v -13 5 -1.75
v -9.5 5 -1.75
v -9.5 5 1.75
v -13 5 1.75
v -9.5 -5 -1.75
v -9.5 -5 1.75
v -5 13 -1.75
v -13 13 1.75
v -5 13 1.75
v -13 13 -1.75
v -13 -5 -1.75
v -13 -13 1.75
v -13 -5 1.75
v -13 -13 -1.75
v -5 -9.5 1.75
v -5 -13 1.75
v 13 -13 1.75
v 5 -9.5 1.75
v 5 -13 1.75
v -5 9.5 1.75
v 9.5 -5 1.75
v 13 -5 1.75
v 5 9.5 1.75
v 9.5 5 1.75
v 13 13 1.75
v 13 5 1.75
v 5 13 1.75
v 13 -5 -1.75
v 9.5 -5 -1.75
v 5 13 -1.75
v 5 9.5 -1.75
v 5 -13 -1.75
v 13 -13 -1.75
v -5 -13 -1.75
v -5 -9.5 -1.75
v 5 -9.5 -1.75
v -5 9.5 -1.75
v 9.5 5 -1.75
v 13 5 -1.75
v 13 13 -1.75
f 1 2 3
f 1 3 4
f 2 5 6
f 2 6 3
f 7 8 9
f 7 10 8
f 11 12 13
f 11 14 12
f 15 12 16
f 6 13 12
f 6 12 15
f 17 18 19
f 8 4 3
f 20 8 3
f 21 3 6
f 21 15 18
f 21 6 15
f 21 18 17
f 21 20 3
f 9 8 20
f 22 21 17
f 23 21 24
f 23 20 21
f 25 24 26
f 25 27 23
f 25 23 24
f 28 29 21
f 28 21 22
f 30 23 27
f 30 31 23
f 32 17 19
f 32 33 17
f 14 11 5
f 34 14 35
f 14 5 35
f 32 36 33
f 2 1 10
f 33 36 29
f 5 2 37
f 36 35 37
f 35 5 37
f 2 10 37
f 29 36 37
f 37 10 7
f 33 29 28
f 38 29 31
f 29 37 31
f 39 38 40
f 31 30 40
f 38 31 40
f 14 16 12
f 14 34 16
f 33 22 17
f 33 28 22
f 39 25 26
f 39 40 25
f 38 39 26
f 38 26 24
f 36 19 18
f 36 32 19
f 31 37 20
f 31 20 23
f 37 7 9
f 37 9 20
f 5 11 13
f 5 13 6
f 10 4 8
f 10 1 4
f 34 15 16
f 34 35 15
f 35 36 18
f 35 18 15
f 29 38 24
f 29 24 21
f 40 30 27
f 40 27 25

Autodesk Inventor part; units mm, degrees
ref_plane "YZ Plane" through (0, 0, 0) normal (1, 0, 0) x (0, 1, 0)
ref_plane "XZ Plane" through (0, 0, 0) normal (0, 1, 0) x (-1, 0, 0)
ref_plane "XY Plane" through (0, 0, 0) normal (0, 0, 1) x (1, 0, 0)
sketch "Sketch1" plane through (0, 0, 0) normal (0, 0, 1) x (1, 0, 0)
  circle A0 centre (0, 0) radius 6
  line L0 (-13, 13) -> (13, 13)
  line L1 (13, 13) -> (13, -13)
  line L2 (13, -13) -> (-13, -13)
  line L3 (-13, -13) -> (-13, 13)
  line L4 (0, 0) -> (13, 13)
  line L5 (6.5, 6.5) -> (13, 13)
  circle A1 centre (9.75, 9.75) radius 0.5
  line L6 (0, 0) -> (-13, 13)
  line L7 (-6.5, 6.5) -> (-13, 13)
  circle A2 centre (-9.75, 9.75) radius 0.5
  line L8 (0, 0) -> (-13, -13)
  line L9 (-6.5, -6.5) -> (-13, -13)
  circle A3 centre (-9.75, -9.75) radius 0.5
  line L10 (0, 0) -> (13, -13)
  line L11 (6.5, -6.5) -> (13, -13)
  circle A4 centre (9.75, -9.75) radius 0.5
  line L12 (-5, -13) -> (5, -13)
  line L13 (5, -13) -> (5, -9.5)
  line L14 (5, -9.5) -> (-5, -9.5)
  line L15 (-5, -9.5) -> (-5, -13)
  line L16 (13, 5) -> (9.5, 5)
  line L17 (9.5, 5) -> (9.5, -5)
  line L18 (9.5, -5) -> (13, -5)
  line L19 (-5, 13) -> (-5, 9.5)
  line L20 (-5, 9.5) -> (5, 9.5)
  line L21 (5, 9.5) -> (5, 13)
  line L22 (-13, -5) -> (-9.5, -5)
  line L23 (-9.5, -5) -> (-9.5, 5)
  line L24 (-9.5, 5) -> (-13, 5)
  point P0 (0, 13)
  point P1 (13, 0)
  point P2 (0, -9.5)
  point P3 (0, -13)
  point P4 (9.5, 0)
  point P5 (0, 9.5)
  point P6 (-9.5, 0)
  dimension "d4" = 12
  dimension "d5" = 26
  dimension "d6" = 26
  dimension "d7" = 1
  dimension "d8" = 360
  dimension "d9" = 10
  dimension "d10" = 3.5
  dimension "d11" = 360
extrude "Extrusion1" add sketch "Sketch1" along normal mid plane 3.5 contours A0 L10 L4 | A0 L4 A1 L1 L16 L17 L18 L10 A4 | L4 L6 A0 | A0 L6 A2 L0 L19 L20 L21 L4 A1 | L10 A4 L2 L13 L14 L15 L8 A3 A0 | A0 L8 L10 | L6 L8 A0 | A0 L8 A3 L3 L22 L23 L24 L6 A2 | A1 L4 | L4 A1 | A4 L10 | L10 A4 | A2 L6 | L6 A2 | A3 L8 | L8 A3
equation "\"d6\" = d5"
properties part number "Spodi Spodnji"
